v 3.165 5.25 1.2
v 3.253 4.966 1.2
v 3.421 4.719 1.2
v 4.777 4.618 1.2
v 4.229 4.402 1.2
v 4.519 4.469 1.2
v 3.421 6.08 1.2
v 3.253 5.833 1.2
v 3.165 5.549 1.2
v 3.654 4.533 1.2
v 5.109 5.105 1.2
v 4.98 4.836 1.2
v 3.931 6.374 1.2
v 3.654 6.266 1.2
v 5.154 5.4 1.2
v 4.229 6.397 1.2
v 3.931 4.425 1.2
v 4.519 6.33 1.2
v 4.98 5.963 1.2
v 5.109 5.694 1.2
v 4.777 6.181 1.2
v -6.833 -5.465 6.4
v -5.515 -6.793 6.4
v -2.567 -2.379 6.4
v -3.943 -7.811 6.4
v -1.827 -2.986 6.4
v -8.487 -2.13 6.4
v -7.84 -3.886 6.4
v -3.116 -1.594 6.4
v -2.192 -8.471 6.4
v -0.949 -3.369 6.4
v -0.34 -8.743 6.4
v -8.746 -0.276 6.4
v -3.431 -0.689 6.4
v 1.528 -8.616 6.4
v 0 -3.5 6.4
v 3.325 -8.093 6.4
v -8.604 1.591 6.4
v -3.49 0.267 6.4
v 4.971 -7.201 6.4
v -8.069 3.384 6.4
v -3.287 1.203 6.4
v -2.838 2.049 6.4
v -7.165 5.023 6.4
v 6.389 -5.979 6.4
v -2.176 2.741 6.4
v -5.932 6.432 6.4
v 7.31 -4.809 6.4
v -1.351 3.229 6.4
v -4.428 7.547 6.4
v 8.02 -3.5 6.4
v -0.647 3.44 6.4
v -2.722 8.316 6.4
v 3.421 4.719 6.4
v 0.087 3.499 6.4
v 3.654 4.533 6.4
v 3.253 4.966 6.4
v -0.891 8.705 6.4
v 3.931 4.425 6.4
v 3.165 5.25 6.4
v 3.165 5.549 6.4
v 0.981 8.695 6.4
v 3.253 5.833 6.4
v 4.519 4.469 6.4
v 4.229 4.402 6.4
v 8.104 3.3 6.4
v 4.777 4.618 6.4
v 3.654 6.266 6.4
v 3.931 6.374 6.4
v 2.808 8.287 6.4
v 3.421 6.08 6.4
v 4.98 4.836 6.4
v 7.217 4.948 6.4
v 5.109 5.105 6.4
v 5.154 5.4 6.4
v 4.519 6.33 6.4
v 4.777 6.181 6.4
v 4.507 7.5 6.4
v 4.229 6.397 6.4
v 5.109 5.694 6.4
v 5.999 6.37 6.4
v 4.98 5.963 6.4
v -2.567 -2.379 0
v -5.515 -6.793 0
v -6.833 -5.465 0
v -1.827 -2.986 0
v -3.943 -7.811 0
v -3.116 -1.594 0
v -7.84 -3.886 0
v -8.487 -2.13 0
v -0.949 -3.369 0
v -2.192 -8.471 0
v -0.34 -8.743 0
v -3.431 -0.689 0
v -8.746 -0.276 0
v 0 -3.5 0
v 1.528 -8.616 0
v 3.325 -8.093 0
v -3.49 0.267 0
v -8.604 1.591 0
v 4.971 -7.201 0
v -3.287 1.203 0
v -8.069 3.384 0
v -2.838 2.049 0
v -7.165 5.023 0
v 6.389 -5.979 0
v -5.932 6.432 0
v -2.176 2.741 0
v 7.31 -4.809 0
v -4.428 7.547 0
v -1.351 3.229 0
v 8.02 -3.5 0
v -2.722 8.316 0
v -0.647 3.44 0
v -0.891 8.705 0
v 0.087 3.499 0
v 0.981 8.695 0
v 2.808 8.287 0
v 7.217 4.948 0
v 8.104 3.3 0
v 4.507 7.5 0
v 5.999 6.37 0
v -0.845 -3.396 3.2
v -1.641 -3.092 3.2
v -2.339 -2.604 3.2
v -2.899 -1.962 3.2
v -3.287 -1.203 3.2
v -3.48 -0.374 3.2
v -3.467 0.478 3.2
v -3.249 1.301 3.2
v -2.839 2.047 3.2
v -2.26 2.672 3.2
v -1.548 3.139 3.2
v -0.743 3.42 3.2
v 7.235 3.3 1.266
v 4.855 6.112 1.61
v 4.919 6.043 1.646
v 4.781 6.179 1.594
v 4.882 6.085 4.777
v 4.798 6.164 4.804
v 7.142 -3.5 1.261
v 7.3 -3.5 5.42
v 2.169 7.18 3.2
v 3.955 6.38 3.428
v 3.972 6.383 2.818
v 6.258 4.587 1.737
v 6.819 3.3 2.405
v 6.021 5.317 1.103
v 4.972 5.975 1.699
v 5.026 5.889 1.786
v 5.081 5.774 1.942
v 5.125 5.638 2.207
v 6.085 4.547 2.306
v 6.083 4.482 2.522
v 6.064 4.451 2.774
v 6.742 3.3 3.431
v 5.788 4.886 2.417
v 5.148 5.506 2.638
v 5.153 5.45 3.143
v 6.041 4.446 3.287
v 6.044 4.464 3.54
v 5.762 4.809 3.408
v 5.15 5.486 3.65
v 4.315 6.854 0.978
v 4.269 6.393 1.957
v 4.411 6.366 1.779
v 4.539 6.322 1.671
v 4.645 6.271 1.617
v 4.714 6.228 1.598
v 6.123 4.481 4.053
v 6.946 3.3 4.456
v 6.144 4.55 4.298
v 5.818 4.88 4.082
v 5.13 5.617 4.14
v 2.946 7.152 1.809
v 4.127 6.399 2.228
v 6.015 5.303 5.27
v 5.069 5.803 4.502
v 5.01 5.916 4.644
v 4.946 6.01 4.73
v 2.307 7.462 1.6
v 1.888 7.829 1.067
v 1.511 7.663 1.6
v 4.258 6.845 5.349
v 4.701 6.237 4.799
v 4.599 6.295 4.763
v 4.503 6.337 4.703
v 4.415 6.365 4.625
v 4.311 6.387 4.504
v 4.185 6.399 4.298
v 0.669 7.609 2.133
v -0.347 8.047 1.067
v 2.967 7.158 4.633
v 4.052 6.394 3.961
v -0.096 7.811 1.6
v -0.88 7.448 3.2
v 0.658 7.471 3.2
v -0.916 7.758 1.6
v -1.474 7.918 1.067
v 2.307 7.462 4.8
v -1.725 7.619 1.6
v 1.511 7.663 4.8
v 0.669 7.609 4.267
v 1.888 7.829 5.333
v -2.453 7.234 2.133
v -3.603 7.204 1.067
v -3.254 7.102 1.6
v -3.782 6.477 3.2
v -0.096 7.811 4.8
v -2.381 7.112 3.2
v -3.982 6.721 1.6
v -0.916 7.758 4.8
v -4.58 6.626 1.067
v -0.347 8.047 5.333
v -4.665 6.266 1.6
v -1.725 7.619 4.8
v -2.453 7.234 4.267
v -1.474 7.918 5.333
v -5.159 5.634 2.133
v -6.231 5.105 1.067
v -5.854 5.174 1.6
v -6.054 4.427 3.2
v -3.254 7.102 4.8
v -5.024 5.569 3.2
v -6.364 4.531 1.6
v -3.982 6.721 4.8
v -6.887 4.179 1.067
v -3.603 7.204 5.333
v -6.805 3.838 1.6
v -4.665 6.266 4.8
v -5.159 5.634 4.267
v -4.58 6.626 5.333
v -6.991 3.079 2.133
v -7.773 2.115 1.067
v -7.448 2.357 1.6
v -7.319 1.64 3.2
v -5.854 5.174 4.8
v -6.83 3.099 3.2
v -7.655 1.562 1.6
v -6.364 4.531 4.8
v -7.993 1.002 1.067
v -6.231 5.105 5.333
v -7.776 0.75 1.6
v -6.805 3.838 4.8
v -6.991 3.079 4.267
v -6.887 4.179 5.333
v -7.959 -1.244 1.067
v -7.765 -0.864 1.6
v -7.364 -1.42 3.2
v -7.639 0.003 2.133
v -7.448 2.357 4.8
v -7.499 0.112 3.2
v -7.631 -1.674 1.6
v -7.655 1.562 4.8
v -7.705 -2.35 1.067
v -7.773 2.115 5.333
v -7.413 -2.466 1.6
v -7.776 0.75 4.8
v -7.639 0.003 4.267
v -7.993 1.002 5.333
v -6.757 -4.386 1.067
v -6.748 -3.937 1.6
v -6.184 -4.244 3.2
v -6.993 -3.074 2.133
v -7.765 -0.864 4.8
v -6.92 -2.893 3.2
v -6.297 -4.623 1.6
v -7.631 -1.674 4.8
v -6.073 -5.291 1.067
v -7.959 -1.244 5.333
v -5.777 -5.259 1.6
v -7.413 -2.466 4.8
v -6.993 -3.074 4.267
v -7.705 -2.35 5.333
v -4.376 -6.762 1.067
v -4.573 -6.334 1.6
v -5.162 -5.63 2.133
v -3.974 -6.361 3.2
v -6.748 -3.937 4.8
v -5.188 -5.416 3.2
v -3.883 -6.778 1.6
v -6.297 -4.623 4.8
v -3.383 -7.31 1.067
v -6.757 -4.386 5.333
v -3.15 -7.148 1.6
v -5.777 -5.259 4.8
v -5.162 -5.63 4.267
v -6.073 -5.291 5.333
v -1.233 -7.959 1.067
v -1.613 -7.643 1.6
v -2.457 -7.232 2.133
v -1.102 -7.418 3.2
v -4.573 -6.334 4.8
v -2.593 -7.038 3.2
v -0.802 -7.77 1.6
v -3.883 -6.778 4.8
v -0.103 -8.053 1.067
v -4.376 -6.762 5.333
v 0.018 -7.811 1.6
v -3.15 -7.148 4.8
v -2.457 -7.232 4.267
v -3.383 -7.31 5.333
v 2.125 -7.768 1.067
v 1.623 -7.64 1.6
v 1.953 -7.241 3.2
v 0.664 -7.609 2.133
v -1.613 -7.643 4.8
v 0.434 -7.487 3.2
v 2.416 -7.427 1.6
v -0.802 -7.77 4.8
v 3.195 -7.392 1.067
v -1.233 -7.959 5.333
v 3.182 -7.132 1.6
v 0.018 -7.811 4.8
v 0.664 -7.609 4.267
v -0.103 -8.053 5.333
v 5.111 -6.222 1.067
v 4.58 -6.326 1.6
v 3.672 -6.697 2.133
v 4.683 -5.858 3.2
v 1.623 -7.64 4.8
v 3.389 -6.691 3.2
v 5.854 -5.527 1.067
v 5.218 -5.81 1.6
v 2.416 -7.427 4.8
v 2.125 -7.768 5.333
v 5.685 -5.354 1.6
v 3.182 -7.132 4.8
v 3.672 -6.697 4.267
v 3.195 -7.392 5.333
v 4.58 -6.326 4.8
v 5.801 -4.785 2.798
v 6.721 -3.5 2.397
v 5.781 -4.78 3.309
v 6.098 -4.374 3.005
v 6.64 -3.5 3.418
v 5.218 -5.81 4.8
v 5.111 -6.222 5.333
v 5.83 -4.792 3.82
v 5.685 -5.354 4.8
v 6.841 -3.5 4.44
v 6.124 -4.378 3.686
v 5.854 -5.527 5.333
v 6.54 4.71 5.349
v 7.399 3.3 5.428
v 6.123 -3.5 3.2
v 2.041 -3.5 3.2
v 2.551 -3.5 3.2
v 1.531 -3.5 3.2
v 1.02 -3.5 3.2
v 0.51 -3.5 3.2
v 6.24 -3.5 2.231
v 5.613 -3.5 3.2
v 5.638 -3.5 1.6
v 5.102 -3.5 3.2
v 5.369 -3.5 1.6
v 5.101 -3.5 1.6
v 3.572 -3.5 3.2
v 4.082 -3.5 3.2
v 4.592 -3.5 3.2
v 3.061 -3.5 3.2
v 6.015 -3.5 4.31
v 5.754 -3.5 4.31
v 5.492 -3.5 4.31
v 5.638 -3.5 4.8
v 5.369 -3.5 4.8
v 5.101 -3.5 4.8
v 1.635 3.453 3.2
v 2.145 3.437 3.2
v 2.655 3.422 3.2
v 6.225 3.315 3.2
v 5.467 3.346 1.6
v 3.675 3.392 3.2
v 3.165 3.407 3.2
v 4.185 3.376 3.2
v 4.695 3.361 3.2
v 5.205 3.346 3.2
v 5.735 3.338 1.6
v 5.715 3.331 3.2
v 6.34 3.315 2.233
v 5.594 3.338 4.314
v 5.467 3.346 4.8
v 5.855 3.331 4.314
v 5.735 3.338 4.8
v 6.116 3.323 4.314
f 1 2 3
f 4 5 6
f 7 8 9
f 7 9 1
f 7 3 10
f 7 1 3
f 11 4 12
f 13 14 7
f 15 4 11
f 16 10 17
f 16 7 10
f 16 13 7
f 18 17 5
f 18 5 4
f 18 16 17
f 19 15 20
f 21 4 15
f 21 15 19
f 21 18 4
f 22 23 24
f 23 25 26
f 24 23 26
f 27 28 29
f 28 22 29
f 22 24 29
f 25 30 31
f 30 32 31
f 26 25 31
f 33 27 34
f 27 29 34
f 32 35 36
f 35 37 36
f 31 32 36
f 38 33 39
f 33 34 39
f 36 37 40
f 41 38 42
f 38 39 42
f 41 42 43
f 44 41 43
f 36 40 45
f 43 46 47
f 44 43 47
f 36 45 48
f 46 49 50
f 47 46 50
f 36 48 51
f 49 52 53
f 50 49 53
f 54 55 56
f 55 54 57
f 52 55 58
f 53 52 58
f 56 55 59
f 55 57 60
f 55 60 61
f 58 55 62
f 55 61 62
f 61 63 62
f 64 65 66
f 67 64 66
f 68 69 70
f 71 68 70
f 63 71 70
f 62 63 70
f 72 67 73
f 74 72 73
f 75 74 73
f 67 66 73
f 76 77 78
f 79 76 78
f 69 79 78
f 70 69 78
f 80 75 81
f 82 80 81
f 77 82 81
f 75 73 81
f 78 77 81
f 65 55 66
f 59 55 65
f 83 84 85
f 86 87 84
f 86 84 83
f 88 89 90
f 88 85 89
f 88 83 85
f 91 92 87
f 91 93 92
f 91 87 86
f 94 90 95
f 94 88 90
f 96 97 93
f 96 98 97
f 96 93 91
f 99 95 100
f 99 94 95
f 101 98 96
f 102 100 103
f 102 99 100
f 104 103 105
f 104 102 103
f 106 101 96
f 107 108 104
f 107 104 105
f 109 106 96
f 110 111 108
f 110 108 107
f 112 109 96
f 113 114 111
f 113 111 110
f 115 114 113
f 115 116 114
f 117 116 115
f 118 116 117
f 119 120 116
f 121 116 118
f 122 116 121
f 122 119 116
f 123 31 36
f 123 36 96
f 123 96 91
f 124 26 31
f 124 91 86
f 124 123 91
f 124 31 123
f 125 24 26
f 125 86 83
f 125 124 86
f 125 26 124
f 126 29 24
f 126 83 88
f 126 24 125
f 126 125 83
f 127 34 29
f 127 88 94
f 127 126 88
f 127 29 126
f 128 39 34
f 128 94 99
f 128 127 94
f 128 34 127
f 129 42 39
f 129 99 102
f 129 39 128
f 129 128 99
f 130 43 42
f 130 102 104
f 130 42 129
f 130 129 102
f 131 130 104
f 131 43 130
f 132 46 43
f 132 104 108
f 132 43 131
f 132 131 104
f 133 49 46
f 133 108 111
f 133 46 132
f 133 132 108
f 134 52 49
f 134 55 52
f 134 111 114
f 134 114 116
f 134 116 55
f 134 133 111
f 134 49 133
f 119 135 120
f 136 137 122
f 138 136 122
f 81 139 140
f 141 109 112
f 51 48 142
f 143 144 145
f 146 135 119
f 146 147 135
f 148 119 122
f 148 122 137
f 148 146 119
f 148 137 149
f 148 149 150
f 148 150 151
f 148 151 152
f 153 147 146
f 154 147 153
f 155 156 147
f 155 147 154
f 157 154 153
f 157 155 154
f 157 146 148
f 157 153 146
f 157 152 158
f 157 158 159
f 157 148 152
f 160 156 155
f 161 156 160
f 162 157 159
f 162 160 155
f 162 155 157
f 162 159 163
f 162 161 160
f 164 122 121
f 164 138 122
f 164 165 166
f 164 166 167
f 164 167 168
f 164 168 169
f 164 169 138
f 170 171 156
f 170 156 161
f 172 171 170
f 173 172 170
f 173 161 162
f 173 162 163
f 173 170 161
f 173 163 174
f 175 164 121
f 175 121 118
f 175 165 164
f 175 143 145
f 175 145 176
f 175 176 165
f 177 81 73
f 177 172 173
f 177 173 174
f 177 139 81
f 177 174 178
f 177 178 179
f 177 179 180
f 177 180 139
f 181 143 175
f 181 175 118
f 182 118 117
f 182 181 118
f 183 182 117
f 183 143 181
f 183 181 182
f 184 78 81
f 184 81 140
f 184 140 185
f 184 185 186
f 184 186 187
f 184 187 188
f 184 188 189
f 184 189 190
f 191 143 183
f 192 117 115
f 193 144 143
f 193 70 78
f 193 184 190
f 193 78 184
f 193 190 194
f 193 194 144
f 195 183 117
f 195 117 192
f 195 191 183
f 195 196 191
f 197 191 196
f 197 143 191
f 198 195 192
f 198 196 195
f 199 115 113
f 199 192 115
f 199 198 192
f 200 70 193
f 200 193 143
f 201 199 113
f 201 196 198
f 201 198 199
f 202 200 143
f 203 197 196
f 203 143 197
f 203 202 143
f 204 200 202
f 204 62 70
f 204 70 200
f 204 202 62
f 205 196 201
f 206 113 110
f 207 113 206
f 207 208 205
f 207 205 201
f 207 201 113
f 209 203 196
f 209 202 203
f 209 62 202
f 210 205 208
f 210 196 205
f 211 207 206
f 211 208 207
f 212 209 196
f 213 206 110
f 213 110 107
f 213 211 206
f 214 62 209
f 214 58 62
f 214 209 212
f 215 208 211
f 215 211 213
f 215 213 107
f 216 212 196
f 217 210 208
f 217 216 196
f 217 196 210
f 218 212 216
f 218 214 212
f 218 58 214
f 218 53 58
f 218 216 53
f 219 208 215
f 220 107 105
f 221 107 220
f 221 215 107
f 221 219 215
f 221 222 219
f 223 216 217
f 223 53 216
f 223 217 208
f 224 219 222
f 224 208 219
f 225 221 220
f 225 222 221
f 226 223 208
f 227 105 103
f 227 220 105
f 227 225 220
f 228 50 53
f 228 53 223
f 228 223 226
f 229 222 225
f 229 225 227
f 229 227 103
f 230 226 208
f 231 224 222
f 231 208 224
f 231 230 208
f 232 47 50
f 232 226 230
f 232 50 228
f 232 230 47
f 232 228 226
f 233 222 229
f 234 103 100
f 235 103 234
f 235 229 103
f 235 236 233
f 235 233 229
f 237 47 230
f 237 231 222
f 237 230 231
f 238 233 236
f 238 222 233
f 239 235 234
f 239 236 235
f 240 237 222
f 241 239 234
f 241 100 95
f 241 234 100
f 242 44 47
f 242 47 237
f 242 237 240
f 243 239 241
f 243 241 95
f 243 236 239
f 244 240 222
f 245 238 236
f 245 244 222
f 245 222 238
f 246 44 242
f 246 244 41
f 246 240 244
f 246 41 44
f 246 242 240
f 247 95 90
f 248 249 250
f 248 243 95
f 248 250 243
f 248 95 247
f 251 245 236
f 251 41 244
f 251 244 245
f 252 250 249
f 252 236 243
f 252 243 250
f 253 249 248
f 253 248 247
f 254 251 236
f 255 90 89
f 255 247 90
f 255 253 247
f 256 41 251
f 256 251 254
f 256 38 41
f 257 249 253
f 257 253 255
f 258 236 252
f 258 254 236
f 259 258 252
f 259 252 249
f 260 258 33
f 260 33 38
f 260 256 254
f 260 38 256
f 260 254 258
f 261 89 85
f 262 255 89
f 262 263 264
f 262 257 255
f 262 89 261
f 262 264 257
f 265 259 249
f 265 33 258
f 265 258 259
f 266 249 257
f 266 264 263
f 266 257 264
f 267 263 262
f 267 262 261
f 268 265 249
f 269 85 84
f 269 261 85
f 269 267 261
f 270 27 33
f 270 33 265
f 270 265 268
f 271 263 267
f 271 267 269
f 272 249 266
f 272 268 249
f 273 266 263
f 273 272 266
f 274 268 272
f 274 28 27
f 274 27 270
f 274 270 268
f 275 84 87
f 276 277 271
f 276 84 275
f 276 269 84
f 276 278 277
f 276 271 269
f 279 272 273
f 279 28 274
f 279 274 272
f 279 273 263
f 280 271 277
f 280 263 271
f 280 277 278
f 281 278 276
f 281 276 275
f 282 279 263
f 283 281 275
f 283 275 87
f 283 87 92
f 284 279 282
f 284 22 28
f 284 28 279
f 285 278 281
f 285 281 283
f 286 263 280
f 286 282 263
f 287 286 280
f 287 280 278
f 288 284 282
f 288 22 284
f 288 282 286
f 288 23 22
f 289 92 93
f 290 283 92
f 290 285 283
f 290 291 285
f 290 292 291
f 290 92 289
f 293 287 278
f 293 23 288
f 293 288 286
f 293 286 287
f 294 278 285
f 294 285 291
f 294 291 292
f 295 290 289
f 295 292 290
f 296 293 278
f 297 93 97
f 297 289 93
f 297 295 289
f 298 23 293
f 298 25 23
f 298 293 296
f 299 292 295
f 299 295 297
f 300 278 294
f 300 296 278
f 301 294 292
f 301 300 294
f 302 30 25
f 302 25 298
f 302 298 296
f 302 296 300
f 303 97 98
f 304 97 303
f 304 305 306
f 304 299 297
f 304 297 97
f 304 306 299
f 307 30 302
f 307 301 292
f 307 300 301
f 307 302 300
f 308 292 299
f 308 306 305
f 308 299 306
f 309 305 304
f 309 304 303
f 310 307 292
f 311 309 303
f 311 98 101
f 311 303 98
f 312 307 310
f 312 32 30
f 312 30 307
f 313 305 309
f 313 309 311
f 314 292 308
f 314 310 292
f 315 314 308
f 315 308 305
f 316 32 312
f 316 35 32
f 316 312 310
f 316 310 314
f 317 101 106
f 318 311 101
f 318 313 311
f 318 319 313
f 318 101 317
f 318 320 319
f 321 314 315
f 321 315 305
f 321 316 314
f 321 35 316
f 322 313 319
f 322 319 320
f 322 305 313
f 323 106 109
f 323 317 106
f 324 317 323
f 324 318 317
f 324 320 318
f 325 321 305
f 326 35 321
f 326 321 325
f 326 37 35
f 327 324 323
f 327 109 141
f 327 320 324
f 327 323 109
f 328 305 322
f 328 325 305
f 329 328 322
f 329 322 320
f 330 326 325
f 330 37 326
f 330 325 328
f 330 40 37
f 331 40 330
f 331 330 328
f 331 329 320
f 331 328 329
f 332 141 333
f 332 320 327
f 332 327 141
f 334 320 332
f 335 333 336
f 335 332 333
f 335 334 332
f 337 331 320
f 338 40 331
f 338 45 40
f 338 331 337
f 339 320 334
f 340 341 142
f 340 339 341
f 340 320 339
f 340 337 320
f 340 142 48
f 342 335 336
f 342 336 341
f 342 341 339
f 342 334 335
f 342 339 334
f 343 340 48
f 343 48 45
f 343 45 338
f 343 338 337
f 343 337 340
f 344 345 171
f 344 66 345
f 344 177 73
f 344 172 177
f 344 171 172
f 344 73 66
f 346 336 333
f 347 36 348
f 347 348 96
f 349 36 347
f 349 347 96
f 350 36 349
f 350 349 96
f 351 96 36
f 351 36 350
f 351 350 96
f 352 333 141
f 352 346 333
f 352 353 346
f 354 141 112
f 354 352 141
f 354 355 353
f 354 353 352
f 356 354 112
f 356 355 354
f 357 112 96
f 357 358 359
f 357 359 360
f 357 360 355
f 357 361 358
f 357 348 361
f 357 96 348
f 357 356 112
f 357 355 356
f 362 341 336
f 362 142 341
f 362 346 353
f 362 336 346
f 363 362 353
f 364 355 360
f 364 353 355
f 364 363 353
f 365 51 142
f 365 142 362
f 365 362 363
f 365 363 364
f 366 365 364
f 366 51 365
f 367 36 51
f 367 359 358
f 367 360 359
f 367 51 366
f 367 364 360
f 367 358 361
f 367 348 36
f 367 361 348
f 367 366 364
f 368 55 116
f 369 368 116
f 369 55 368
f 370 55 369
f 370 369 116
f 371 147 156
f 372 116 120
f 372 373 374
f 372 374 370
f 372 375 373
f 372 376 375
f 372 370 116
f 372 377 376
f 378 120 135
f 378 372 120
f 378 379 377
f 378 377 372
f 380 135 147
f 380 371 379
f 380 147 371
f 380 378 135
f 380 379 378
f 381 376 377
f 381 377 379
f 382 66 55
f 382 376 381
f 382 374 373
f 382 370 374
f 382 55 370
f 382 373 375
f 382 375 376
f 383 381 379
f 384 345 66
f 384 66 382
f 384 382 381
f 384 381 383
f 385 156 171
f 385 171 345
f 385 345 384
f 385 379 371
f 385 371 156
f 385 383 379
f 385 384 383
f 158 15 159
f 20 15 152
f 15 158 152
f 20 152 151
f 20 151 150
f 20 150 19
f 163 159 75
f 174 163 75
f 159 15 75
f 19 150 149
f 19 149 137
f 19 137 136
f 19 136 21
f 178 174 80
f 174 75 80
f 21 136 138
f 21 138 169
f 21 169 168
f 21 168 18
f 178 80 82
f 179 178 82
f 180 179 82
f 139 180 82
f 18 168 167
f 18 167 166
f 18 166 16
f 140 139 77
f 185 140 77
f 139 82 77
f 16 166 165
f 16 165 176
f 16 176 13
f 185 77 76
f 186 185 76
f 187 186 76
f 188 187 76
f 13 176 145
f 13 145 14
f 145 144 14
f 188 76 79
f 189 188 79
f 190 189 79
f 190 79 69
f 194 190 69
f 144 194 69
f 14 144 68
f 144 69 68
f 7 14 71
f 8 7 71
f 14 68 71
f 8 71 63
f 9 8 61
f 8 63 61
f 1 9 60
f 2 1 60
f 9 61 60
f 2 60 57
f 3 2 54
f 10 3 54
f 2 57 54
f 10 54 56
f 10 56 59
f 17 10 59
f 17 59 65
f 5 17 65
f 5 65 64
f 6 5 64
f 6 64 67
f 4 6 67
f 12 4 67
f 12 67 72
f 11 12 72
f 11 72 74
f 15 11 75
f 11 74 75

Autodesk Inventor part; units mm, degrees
ref_plane "YZ Plane" through (0, 0, 0) normal (1, 0, 0) x (0, 1, 0)
ref_plane "XZ Plane" through (0, 0, 0) normal (0, 1, 0) x (-1, 0, 0)
sketch "Sketch1" plane through (0, 0, 0) normal (0, 0, 1) x (1, 0, 0)
  arc A0 (0.0868, 3.4989) -> (0, -3.5) centre (0, 0) ccw
  arc A1 (8.1039, 3.3) -> (8.0195, -3.5) centre (0, 0) ccw
  line L0 (0.0868, 3.4989) -> (8.1039, 3.3)
  line L1 (0, -3.5) -> (8.0195, -3.5)
  dimension "d0" = 7
  dimension "d1" = 17.5
  dimension "d2" = 3.3
ref_plane "Work Plane1" through (0, 0, 3.2) normal (0, 0, 1) x (1, 0, 0)
sketch "Sketch2" plane through (0, 0, 3.2) normal (0, 0, 1) x (1, 0, 0)
  arc A0 (6.735, 3.3) -> (6.6332, -3.5) centre (0, 0) ccw
  arc A1 (0.1047, 3.4984) -> (0, -3.5) centre (0, 0) ccw
  line L0 (0.1047, 3.4984) -> (6.735, 3.3)
  line L1 (0, -3.5) -> (6.6332, -3.5)
  dimension "d4" = 15
  dimension "d5" = 7
  dimension "d6" = 3.3
ref_plane "Work Plane2" through (0, 0, 6.4) normal (0, 0, 1) x (1, 0, 0)
sketch "Sketch3" plane through (0, 0, 6.4) normal (0, 0, 1) x (1, 0, 0)
  arc A0 (8.1039, 3.3) -> (8.0195, -3.5) centre (0, 0) ccw
  arc A1 (0.0868, 3.4989) -> (0, -3.5) centre (0, 0) ccw
  line L0 (0.0868, 3.4989) -> (8.1039, 3.3)
  line L1 (0, -3.5) -> (8.0195, -3.5)
  dimension "d8" = 17.5
  dimension "d9" = 7
  dimension "d10" = 3.3
loft "Loft1" add profiles "Sketch1", "Sketch2", "Sketch3"
sketch "Sketch4" plane through (0, -3.5, 6.4) normal (0, 0, 1) x (1, 0, 0)
  circle A0 centre (4.1539, 8.8995) radius 1
  line L0 (8.1039, 6.8) -> (0.0868, 6.9989) projected
  point P0 (0, 3.5)
  point P1 (4.0953, 6.8995)
  dimension "d17" = 2
  dimension "d18" = 2
  dimension "d19" = 3.95
extrude "Extrusion1" cut sketch "Sketch4" against normal blind 5.2
properties part number "sg90_shaft_support"
